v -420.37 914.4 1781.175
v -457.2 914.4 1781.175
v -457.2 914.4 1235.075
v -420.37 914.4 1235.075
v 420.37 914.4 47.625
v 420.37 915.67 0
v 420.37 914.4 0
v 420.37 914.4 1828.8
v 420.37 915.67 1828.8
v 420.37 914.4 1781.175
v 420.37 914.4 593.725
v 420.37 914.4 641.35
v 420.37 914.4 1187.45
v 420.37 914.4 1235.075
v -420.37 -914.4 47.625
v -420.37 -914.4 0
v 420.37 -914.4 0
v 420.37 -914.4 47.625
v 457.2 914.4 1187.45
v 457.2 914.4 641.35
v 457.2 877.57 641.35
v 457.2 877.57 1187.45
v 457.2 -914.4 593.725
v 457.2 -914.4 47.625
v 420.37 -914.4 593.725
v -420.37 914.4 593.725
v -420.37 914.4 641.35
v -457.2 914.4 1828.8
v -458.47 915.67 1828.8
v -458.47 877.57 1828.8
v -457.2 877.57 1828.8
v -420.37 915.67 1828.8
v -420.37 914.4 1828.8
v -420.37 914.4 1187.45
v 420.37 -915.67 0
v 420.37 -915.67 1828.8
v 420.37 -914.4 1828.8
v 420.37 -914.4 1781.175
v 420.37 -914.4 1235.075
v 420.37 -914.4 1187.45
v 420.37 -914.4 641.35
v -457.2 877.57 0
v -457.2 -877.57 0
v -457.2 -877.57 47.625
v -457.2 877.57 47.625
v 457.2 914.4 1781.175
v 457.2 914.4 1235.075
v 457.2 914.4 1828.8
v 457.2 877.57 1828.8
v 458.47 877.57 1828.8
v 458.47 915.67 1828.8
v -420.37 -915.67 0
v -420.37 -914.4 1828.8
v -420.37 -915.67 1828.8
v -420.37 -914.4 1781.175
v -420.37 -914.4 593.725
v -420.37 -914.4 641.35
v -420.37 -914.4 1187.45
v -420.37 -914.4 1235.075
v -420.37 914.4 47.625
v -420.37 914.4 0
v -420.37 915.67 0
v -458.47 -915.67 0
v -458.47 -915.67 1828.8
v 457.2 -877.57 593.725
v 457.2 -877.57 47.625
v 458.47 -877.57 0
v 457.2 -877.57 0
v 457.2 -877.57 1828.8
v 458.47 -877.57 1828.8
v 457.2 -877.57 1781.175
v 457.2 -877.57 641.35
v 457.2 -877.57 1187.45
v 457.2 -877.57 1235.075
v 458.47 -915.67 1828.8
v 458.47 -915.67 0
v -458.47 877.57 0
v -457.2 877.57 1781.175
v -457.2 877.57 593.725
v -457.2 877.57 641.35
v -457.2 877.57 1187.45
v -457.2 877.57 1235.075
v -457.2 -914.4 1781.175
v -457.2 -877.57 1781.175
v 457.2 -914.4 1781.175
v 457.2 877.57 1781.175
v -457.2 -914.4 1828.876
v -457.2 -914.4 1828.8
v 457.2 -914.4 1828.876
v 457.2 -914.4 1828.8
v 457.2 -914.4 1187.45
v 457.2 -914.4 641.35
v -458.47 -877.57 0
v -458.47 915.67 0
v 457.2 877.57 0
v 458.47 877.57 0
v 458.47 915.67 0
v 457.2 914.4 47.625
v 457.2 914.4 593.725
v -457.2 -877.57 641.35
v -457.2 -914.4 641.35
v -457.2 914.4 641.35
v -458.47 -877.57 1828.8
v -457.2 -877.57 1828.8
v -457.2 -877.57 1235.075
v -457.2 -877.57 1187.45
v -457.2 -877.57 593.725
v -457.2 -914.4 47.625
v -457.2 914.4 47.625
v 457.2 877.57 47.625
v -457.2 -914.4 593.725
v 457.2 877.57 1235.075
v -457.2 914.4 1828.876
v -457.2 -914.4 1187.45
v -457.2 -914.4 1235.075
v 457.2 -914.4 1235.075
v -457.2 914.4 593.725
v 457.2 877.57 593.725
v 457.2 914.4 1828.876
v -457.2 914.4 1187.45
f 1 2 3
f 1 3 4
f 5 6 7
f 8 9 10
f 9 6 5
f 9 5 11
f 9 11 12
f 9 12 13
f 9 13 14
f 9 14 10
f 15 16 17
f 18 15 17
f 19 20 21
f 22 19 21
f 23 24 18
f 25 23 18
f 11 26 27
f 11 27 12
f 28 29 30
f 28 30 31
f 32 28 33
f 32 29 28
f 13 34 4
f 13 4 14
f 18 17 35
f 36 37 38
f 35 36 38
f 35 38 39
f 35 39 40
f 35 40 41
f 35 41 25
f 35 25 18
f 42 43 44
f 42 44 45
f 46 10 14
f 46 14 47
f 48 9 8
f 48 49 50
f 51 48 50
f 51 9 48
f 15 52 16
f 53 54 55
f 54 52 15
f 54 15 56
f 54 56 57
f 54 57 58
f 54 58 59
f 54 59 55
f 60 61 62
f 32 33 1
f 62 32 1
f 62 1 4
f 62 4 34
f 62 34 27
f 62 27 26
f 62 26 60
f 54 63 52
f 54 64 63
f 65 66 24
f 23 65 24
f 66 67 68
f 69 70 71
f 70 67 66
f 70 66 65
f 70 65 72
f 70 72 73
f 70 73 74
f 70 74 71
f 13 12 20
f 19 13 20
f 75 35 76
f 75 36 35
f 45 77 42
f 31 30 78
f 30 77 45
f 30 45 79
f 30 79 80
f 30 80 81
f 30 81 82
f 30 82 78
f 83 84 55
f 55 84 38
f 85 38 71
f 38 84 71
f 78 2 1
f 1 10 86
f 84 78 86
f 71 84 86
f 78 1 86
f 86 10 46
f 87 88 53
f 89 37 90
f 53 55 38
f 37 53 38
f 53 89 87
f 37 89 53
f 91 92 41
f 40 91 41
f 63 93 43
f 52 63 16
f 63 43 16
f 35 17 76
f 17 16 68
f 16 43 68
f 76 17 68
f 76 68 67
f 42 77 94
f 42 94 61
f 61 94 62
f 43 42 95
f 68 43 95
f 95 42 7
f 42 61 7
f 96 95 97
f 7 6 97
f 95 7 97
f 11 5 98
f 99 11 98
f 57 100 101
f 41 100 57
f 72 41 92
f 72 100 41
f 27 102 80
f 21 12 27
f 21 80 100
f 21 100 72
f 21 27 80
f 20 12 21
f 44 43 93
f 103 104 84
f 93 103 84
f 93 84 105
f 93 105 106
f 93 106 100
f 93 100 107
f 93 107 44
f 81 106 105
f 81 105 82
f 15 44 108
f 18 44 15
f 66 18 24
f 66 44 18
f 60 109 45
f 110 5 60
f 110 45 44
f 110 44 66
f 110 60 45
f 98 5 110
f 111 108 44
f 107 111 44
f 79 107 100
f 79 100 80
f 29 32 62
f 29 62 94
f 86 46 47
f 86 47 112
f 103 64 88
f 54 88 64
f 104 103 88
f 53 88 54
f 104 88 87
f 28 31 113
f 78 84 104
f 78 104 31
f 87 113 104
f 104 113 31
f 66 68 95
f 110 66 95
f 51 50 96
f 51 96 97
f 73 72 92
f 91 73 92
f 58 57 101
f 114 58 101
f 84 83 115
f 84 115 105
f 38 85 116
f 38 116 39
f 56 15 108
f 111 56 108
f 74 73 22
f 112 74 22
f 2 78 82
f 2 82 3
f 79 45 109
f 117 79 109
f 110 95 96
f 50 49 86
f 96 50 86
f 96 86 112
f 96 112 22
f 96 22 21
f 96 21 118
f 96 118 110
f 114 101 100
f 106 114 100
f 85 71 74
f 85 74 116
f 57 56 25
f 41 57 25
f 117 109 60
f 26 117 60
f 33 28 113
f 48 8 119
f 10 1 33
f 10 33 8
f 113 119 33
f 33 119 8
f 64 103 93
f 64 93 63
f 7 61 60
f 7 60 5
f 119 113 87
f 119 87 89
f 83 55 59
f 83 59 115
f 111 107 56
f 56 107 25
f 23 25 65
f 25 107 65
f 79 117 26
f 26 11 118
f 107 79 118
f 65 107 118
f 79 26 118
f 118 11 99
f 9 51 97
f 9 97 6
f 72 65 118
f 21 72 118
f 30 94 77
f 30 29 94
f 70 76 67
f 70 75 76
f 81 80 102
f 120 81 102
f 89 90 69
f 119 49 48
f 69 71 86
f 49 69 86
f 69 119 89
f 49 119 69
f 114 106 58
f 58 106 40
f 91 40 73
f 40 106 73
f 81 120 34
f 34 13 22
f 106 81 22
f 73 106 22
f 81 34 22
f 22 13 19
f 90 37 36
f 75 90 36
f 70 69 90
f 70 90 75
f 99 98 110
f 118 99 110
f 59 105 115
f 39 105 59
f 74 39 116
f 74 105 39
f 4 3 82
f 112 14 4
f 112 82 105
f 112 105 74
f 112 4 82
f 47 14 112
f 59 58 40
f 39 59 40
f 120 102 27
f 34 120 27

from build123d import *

# Parameters (mm, degrees)
F0_W          = 914.4
F0_H          = 1828.8
F1_DEPTH      = 47.625
F3_DEPTH      = 1781.175
F3_DEPTH_BACK = 47.625
F5_W          = 914.4
F5_H          = 1828.8
F6_DEPTH      = 47.625
F8_W          = 914.4
F8_H          = 1828.8
F9_DEPTH      = 47.625
F11_W         = 914.4
F11_H         = 1828.8
F12_DEPTH     = 47.7012


with BuildPart() as f1:
    # F0 (on Top) → F1 (new body)
    with BuildSketch(Plane.XY):
        Rectangle(F0_W, F0_H)
    extrude(amount=F1_DEPTH)

    # F2 (on face) → F3 (join, two sides)
    with BuildSketch(Plane.XY.offset(47.625)) as f3_sk:
        Polygon((458.47, -915.67), (458.47, -877.57), (457.2, -877.57), (457.2, -914.4), (420.37, -914.4), (420.37, -915.67), align=None)
        Polygon((-458.47, -915.67), (-420.37, -915.67), (-420.37, -914.4), (-457.2, -914.4), (-457.2, -877.57), (-458.47, -877.57), align=None)
        Polygon((-458.47, 915.67), (-458.47, 877.57), (-457.2, 877.57), (-457.2, 914.4), (-420.37, 914.4), (-420.37, 915.67), align=None)
        Polygon((458.47, 915.67), (420.37, 915.67), (420.37, 914.4), (457.2, 914.4), (457.2, 877.57), (458.47, 877.57), align=None)
    extrude(amount=F3_DEPTH)
    extrude(f3_sk.sketch, amount=-F3_DEPTH_BACK)

    # F5 (on offset) → F6 (join)
    with BuildSketch(Plane.XY.offset(593.725)):
        Rectangle(F5_W, F5_H)
    extrude(amount=F6_DEPTH)

    # F8 (on offset) → F9 (join)
    with BuildSketch(Plane.XY.offset(1187.45)):
        Rectangle(F8_W, F8_H)
    extrude(amount=F9_DEPTH)

    # F11 (on offset) → F12 (join)
    with BuildSketch(Plane.XY.offset(1781.175)):
        Rectangle(F11_W, F11_H)
    extrude(amount=F12_DEPTH)


solid = f1.part
